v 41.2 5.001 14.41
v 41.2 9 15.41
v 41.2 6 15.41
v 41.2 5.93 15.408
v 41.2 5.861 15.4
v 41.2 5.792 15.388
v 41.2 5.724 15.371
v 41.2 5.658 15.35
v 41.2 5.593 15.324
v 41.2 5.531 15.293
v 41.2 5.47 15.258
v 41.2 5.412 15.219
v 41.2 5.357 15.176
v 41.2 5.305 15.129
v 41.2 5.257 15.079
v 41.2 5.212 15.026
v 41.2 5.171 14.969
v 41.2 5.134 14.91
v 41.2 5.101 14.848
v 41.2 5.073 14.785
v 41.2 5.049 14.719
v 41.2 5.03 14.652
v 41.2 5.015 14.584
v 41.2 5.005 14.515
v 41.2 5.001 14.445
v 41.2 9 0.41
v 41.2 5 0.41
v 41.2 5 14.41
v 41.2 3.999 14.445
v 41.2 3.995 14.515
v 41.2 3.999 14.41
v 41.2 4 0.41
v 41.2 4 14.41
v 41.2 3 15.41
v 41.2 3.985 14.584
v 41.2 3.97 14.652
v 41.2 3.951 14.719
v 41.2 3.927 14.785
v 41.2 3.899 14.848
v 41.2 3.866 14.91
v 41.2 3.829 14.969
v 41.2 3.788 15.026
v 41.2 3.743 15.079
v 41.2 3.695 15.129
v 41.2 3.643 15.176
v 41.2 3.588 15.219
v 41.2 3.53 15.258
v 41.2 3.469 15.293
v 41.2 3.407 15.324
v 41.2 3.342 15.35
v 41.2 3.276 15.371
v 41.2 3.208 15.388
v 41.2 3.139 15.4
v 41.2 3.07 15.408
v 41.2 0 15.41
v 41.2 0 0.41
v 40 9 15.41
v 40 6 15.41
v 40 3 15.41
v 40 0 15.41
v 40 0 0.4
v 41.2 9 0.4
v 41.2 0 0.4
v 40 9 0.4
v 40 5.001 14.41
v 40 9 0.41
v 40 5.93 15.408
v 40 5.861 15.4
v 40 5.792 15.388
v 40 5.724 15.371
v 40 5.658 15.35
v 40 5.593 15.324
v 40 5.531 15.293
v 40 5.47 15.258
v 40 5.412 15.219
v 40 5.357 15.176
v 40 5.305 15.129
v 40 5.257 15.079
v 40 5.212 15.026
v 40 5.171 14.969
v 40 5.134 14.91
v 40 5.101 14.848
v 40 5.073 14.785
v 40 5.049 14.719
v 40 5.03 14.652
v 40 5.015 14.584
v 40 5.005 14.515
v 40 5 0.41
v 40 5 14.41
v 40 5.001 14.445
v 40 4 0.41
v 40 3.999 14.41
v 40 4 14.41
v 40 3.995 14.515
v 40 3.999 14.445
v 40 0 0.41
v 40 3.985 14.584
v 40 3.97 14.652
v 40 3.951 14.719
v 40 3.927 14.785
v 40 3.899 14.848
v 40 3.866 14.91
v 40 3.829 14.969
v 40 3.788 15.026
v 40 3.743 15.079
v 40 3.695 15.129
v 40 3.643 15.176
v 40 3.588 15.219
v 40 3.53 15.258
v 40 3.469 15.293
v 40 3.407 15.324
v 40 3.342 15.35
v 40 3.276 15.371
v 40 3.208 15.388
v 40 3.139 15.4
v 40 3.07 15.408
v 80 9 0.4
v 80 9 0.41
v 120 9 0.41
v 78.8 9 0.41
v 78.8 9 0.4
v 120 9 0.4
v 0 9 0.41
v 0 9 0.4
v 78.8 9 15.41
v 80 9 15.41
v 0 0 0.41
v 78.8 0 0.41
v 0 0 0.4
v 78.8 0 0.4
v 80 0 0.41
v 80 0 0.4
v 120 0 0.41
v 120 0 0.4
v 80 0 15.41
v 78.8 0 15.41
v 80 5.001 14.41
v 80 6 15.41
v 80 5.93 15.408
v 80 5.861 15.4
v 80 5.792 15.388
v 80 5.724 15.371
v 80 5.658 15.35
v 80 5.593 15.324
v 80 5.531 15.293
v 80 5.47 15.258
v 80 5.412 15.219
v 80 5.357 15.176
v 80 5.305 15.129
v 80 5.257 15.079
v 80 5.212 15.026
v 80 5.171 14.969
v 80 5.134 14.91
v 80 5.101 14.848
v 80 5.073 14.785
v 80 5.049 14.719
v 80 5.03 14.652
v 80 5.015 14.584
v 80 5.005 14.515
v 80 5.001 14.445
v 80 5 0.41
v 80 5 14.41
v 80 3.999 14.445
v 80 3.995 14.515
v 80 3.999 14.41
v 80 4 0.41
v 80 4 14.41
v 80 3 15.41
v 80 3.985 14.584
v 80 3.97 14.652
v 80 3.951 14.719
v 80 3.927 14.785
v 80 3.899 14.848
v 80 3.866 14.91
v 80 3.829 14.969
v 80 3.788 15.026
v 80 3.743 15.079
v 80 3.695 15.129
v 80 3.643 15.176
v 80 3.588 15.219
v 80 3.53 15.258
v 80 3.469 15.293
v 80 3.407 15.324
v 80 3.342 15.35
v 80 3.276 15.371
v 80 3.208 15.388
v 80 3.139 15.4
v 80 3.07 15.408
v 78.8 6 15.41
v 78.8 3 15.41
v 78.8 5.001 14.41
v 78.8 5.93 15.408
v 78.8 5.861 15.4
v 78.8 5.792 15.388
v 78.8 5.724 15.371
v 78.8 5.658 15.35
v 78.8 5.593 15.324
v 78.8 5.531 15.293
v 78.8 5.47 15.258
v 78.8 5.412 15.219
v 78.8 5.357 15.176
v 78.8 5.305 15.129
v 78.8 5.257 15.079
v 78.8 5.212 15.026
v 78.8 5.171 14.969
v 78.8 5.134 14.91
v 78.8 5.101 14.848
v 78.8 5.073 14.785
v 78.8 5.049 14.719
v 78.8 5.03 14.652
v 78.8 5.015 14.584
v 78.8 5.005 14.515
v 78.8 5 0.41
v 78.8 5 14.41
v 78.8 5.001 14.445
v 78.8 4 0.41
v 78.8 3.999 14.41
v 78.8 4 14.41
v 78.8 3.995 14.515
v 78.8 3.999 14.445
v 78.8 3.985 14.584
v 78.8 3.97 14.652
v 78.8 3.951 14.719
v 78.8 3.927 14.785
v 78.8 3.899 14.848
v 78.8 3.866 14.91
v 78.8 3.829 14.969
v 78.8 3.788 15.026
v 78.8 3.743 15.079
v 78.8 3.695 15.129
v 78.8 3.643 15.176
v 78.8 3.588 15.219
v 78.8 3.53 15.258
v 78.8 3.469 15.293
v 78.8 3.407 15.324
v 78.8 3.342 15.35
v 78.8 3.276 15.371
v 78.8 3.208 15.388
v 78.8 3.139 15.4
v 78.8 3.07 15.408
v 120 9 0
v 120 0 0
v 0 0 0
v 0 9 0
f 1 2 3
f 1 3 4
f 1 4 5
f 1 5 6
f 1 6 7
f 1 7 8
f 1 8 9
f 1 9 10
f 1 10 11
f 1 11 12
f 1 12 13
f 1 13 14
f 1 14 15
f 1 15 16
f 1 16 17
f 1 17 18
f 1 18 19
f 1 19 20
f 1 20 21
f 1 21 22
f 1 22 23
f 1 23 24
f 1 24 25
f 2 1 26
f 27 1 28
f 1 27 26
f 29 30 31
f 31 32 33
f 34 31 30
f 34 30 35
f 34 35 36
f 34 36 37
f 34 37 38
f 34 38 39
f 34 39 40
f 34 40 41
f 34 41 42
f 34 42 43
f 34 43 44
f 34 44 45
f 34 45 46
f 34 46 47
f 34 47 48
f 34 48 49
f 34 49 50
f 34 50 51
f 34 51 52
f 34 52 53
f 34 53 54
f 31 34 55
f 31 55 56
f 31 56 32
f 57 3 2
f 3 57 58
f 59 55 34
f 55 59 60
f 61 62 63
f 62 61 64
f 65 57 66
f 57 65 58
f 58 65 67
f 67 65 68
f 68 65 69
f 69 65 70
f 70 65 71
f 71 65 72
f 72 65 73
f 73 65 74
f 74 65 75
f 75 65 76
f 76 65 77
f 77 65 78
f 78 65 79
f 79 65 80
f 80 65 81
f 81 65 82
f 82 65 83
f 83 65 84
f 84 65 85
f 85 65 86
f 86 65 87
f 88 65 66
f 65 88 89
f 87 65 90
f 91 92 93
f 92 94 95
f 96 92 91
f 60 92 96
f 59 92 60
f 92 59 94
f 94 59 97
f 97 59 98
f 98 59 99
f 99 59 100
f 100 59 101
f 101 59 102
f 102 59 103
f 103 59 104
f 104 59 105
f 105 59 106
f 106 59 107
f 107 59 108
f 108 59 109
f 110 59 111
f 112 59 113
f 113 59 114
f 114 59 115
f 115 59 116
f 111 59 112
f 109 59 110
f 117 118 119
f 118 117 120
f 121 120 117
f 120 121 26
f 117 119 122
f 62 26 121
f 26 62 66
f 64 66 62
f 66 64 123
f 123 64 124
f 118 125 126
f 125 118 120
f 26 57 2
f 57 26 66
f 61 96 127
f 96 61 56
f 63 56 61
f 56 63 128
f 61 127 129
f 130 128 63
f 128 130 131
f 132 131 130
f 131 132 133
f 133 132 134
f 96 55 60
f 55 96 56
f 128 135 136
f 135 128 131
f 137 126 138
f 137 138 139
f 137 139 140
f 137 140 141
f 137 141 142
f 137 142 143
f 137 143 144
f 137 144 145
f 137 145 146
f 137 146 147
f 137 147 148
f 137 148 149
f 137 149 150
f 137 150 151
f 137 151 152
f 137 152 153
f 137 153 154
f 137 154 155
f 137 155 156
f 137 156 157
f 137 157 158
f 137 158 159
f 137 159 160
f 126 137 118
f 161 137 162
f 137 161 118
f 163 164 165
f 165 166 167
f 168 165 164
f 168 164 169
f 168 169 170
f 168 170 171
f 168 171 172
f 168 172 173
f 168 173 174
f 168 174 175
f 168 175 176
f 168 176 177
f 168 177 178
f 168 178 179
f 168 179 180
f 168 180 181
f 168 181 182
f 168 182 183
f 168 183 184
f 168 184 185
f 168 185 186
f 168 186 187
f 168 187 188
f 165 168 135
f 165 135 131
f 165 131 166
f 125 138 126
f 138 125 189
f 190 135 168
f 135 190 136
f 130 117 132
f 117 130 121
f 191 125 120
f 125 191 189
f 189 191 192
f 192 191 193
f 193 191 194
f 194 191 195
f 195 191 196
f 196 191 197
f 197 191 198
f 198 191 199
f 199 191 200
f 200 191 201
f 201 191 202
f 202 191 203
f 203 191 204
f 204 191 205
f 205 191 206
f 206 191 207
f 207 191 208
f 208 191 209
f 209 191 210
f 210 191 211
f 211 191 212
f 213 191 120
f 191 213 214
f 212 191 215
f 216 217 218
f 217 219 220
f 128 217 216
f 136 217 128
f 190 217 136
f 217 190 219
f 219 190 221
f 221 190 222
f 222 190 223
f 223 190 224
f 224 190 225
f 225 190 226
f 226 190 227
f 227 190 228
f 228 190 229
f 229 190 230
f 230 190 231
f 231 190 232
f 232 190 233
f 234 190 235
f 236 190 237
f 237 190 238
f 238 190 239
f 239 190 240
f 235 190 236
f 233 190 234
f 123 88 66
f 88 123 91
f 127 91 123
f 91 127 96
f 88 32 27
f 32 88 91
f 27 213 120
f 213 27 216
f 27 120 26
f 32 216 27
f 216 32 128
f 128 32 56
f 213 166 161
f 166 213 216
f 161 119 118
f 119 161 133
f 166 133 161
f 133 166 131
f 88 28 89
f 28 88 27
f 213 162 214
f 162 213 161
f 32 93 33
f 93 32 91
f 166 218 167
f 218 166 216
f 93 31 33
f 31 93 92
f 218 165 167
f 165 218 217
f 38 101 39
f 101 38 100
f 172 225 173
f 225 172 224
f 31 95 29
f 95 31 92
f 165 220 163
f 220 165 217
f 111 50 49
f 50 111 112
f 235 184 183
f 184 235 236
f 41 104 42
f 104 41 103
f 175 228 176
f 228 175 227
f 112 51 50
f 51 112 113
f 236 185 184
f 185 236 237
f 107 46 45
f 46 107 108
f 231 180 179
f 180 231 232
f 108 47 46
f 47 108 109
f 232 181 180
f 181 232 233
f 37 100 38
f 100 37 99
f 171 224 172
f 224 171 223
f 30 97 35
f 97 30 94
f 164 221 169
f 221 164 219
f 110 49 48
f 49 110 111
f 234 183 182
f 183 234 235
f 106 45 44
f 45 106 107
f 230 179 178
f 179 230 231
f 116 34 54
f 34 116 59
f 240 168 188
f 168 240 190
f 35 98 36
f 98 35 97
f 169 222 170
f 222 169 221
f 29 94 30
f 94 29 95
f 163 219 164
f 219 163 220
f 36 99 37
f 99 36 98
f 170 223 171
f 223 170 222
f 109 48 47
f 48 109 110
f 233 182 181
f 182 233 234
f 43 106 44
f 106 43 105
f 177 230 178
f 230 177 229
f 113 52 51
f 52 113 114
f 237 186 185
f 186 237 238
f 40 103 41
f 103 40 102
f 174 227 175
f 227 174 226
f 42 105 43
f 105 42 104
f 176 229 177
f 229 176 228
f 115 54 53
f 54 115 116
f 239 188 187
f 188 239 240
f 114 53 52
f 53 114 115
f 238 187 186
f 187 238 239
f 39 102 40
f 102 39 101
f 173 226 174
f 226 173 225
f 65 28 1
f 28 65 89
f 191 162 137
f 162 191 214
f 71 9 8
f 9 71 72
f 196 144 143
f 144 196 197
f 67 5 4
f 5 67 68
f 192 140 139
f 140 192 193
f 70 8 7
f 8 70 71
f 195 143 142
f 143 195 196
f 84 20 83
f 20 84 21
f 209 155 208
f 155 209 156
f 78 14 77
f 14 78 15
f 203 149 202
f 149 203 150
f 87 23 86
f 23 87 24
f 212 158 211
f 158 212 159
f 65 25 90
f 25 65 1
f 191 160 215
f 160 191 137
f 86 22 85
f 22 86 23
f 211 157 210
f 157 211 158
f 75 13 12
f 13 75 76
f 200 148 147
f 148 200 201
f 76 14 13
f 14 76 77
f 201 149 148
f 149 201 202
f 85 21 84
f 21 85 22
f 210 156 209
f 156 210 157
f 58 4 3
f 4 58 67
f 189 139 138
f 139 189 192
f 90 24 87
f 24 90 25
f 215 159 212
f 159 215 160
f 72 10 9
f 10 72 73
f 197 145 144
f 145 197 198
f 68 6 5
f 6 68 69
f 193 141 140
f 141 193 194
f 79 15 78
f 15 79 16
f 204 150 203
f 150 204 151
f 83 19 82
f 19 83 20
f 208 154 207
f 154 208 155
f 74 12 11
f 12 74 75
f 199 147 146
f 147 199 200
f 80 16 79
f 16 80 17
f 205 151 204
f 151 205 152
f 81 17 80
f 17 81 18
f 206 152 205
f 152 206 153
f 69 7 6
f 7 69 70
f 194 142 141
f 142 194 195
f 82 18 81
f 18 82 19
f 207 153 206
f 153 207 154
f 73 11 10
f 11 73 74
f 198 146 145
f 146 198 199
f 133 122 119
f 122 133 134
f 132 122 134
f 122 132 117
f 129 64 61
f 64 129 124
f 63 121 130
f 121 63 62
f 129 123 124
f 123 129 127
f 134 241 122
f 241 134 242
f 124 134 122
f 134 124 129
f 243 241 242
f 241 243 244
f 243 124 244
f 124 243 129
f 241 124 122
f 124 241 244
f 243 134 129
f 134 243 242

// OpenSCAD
// file: ../../Base/Rotation.scad
// Fischertechnik Box Foundation
// Geometry Helpers Rotation

include <PlacementOptions.scad>

// getRotatedSpace(space, rotation=NoRotation)
// Rotates the space dependent on the specified rotation

function getRotatedSpace(space, rotation=NoRotation) = [
    (rotation == Rotate90 || rotation == Rotate270) ? space.y : space.x,
    (rotation == Rotate90 || rotation == Rotate270) ? space.x : space.y
];

// Rotates the given space around the fixed left lower corner
// space = the space the children needs as width/depth list [width,depth]
// rotation = 0 Rotate0 degrees, 1 Rotate90 degrees, 2 Rotate180 degrees, 3 Rotate270 degrees (equivalent to -90)

module RotateFix(space, rotation=NoRotation) {
    dy = (rotation == Rotate0 || rotation == Rotate270) ? 0 :
        (rotation == Rotate90) ? space.x :
        space.y;
    dx = (rotation < Rotate180) ? 0 :
        (rotation == Rotate180) ? space.x :
        space.y;
    
    translate([dx, dy, 0])
        rotate([0, 0, rotations[rotation]])
            children();
}
// file: ../../Base/Alignment.scad
// Fischertechnik Box Foundation
// Geometry Helpers Alignment

include <PlacementOptions.scad>

// getAlignedX(elementWidth, spaceWidth, align=AlignRight, offset=0)
// Gets the aligned X offset of an element with the given
// width in the given space.
// elementWidth = The width of the element to positon
// spaceWidth = The space where the element should be aligned
// align = 0 AlignLeft, 1 AlignCenter, 2 AlignRight
// offset = an optional offset from the aligned position. When
// aligned left or centered, then positive values are in X direction.
// When aligned right then positive values are in negative X direction.

function getAlignedX(elementWidth, spaceWidth, align=AlignRight, offset=0) =
    (align == AlignLeft) ?
        offset :
        ((align == AlignCenter) ?
        (spaceWidth - elementWidth)/2 + offset :
        spaceWidth - offset - elementWidth);

// getAlignedY(elementDepth, spaceDepth, align=AlignTop, offset=0)
// Gets the aligned Y offset of an element with the given
// depth in the given space.
// elementDepth = The depth of the element to positon
// spaceDepth = The space where the element should be aligned
// align = 0 AlignBottom, 1 AlignCenter, 2 AlignTop
// offset = an optional offset from the aligned position. When
// aligned bottom or centered, then positive values are in Y direction.
// When aligned top then positive values are in negative Y direction.

function getAlignedY(elementDepth, spaceDepth, align=AlignTop, offset=0) =
    (align == AlignBottom) ?
        offset :
        ((align == AlignCenter) ?
        (spaceDepth - elementDepth)/2 + offset :
        spaceDepth - offset - elementDepth);
// file: ../../Base/PlacementOptions.scad
// Fischertechnik Box Foundation
// Placement Options

// Alignment
NoAlign = 0;
AlignLeft = 1;
AlignBottom = 2;
AlignCenter = 3;
AlignRight = 4;
AlignTop = 5;

// Element rotation degree steps
rotations = [0, -90, -180, -270];

// Rotation
NoRotation = 0;
Rotate0 = 0;
Rotate90 = 1;
Rotate180 = 2;
Rotate270 = 3;

// Docking (seen from above)
NoDock = -1;
DockLeft = 0;
DockTop = 1;
DockRight = 2;
DockCorner = 2;
DockBottom = 3;

// Web corners
LowerLeft = 0;
UpperLeft = 1;
UpperRight = 2;
LowerRight = 3;

// Web position relative to corner
LeftOfCorner = 0;
RightOfCorner = 1;
// file: ../../Base/Boxes.scad
// Fischertechnik Box Foundation
// Pre-designed Boxes

use <Constants.scad>

include <PlacementOptions.scad>

box190Width = 190;
box190Depth = 130;
box130Width = 130;
box130Depth = 95;

// Values are from an original ec3 box
topBottomDifference = 1.5;
outerHeight = 40;
innerHeight = 38.2;
baseThickness = outerHeight - innerHeight;
stackExcess = 5.7;
radius = 3.5;
wallThickness = 1.5;
tolerance = 0.2;
stackOffset = innerHeight - stackExcess;

boxUsageHeight = stackOffset;
boxWallThickness = wallThickness;
boxBaseThickness = baseThickness;
boxWebWidth = 3.0;

// getBoxWallThickness()
// Gets the wall thickness of a Fischertechnik Box
function getBoxWallThickness() = boxWallThickness;

// getBoxUsageHeight()
// Gets the usable height of a Fischertechnik box
function getBoxUsageHeight() = boxUsageHeight;

// getBoxInnerHeight()
// Gets the inner height of a Fischertechnik box, including the stack excess
function getBoxInnerHeight() = innerHeight;

// getBoxBaseThickness()
// Gets the thickness of the Fischertechnik box base.
function getBoxBaseThickness() = boxBaseThickness;

// getBoxWebWidth()
// Gets the width of a box web
function getBoxWebWidth() = boxWebWidth;

// getBox190Space()
// Gets the usable inner space of a Box 190 as an x/y-list
function getBox190Space() = [
    box190Width - 2*getBoxWallThickness() - topBottomDifference, 
    box190Depth - 2*getBoxWallThickness() - topBottomDifference ];

// BoxBase(width, depth)
// Creates an empty stackable Fischertechnik compatible box
// width = Outer width of the box (190, 130, ...)
// depth = Outer depth of the box (130, 95, ...)

module BoxBase(width, depth, height=outerHeight) {    
    thinPlate = 0.01;

    innerHeight = height - baseThickness;    
    
    module BodyPlate(width, depth) {
        translate([radius, radius])
        hull() {
            w = width-2*radius;
            d = depth-2*radius;
            cube([w, d, thinPlate]);
            cylinder(thinPlate, r=radius, $fn=getFragments());
            translate([w, 0])
                cylinder(thinPlate, r=radius, $fn=getFragments());
            translate([w, d])
                cylinder(thinPlate, r=radius, $fn=getFragments());
            translate([0, d])
                cylinder(thinPlate, r=radius, $fn=getFragments());
        }
    }
    
    module Body(tolerance=tolerance) {
        hull() {
            // Bottom with tolerance to fit into the original boxes when stacked
            translate([-wallThickness+tolerance, -wallThickness+tolerance, -baseThickness])
                BodyPlate(width-topBottomDifference-2*tolerance, depth-topBottomDifference-2*tolerance);
            
            // Top
            translate([-wallThickness-topBottomDifference/2, -wallThickness-topBottomDifference/2, innerHeight-thinPlate])
                BodyPlate(width, depth);
         }
    }

    module Cutoff() {
        hull() {
            coWidth = width - 2*wallThickness;
            coDepth = depth - 2*wallThickness;
            
            // Bottom
            BodyPlate(coWidth-topBottomDifference, coDepth-topBottomDifference);

            // Top
            translate([-topBottomDifference/2, -topBottomDifference/2, innerHeight+thinPlate]) 
                BodyPlate(coWidth, coDepth);
        }
    }
    
    difference() {        
        Body();
        Cutoff();
        stackOffset = innerHeight - stackExcess;
        translate([0, 0, stackOffset + baseThickness])
            Body(tolerance=0);
    }
}

// Creates the Fischertechnik empty box 130x190 mm and places it at position 0,0
// 190x130 are the outer sizes, the inner space is slightly smaller. Use getBox190Space() to get the inner sizes.
// The box is positioned that the usable inner space is at the 0,0,0 position. The

module Box190() {
    BoxBase(box190Width, box190Depth);
}

// Gets the usable inner space of a Box 130 as an x/y-list
function getBox130Space() = [
    box130Width - 2*getBoxWallThickness() - topBottomDifference, 
    box130Depth - 2*getBoxWallThickness() - topBottomDifference ];

// Creates the Fischertechnik empty box 95x130 mm and places it at position 0,0
// 190x130 are the outer sizes, the inner space is slightly smaller. Use getBox190Space() to get the inner sizes.
// The box is positioned that the usable inner space is at the 0,0,0 position. The

module Box130() {
    BoxBase(box130Width, box130Depth);
}

// Creates a web at the specified box walls
// corner 0 = LowerLeft, 1 = UpperLeft, 2 = UpperRight, 3 = LowerRight
// side 0 = LeftOfCorner, 1 = RightOfCorner
// distance = Distance in mm from the corner
// boxSpace = inner width and depth of the box (default: Box 190)
// webWidth = length of the web (default is 3 mms)
// webThickness = thickness of the web (default is 1 mm)

module BoxWeb(corner, side, distance, boxSpace=getBox190Space(), webWidth=getBoxWebWidth(), webThickness=1.0) {
    sink = getBoxWallThickness()/2;

    width = (corner % 2 == 0) ? 
            (side == LeftOfCorner ? webWidth : webThickness) :
            (side == LeftOfCorner ? webThickness : webWidth);

    depth = (corner % 2 == 0) ? 
            (side == RightOfCorner ? webWidth : webThickness) :
            (side == RightOfCorner ? webThickness : webWidth);
    
    xDiff = corner == LowerLeft ? 
                (side == LeftOfCorner ? -sink : distance) :
            (corner == UpperLeft ?                
                (side == LeftOfCorner ? distance : -sink) :
            (corner == UpperRight ?
                (side == LeftOfCorner ? boxSpace.x-webWidth+sink : boxSpace.x-distance-webThickness) :
                (side == LeftOfCorner ? boxSpace.x-distance-webThickness: boxSpace.x-webWidth+sink)));

    yDiff = corner == LowerLeft ? 
                (side == RightOfCorner ? -sink : distance) :
            (corner == UpperLeft ?
                (side == RightOfCorner ? boxSpace.y-distance : boxSpace.y-webWidth+sink) :
            (corner == UpperRight ?
                (side == RightOfCorner ? boxSpace.y-webWidth+sink : boxSpace.y-distance) :
                (side == RightOfCorner ? distance : -sink)));
    
    translate([xDiff, yDiff, -getExcess()])
        cube([width, depth, boxUsageHeight + 2*getExcess()]);
}
// file: ../../Base/Placement.scad
// Fischertechnik Box Foundation
// Geometry Helpers Placement

use <Constants.scad>
use <Alignment.scad>
use <Rotation.scad>
use <Boxes.scad>

include <PlacementOptions.scad>

// Place(x=0, y=0, elementSpace=[0,0], alignX=AlignLeft, alignY=AlignBottom, rotation=Rotate0, boxSpace=getBox190Space())
// Places the child at the specified position
// y = Y-Position. This is a relative position when an X aligment is specified.
// x = X-Position. This is a relative position when an Y aligment is specified.
// elementSpace = space of the element to be placed [x,y]
// alignX = -1=NoAlign, 0 AlignLeft, 1 AlignCenter, 3 AlignRight (elementSpace and boxSpace required!)
// alignY = -1=NoAlign, 2 AlignBottom, 1 AlignCenter, 4 AlignTop (elementSpace and boxSpace required!)
// rotation = 0 Rotate0 0 degrees, 1 Rotate90 90 degrees, 
// 2 Rotate180 180 degrees, 3 Rotate270 270 degrees (equivalent to -90)
// boxSpace = Inner space of the box where the placement occurs [x,y] - default is Box 190x130 inner space

module Place(x=0, y=0, elementSpace=[0,0], 
  alignX=AlignLeft, alignY=AlignBottom, 
  rotation=NoRotation, boxSpace=getBox190Space()) {

    module Position(x, y, space, rotation=Rotate0) {
        translate([x, y, 0])
            RotateFix(space, rotation)
                children();
    }

    space = getRotatedSpace(elementSpace, rotation);
    alignedX = getAlignedX(space.x, boxSpace.x, alignX, x);
    alignedY = getAlignedY(space.y, boxSpace.y, alignY, y);
    Position(alignedX, alignedY, elementSpace, rotation)
        children();
}

// Center(space=getBox130Space(), elementSpace=[0,0])
// space = Space where the children is centered. For cylinder use centered=true and no elementSpace.
// elementSpace = space of the element to be centered [x,y]

module Center(space=getBox190Space(), elementSpace=[0,0]) {
    Place(elementSpace=elementSpace, boxSpace=space, alignX=AlignCenter, alignY=AlignCenter)
        children();
}

// CenterHorizontal(width=0, y=0, offset=0, space=getBox130Space())
// width = Width of the element to be placed.
// y = Y position of the element
// offset = Offset from the center position (negative will be left of the center)
// space = Space where the element is placed

module CenterHorizontal(width=0, y=0, offset=0, space=getBox190Space()) {
    Place(x=offset, y=y, elementSpace=[width, 0], boxSpace=space, alignX=AlignCenter)
        children(0);
}

// CenterVertical(depth=0, x=0, offset=0, space=getBox130Space())
// depth = Depth of the element to be placed.
// x = X position of the element
// offset = Offset from the center position (negative will be down of the center)
// space = Space where the element is placed

module CenterVertical(depth=0, x=0, offset=0, space=getBox190Space()) {
    Place(x=x, y=offset, elementSpace=[0, depth], boxSpace=space, alignY=AlignCenter)
        children(0);
}

// getIsVertical(align)
// True if the specified alignment needs a vertical orientation for a divider (AlignRight, AlignLeft)

function getIsVertical(align) = (align == AlignRight || align == AlignLeft);

// getIsHorizontal(align)
// True if the specified alignment needs a horizontal orientation for a divider (AlignTop, AlignBottom)

function getIsHorizontal(align) = (align == AlignTop || align == AlignBottom);
// file: ../../Elements/AxisClip10.scad
// Fischertechnik Box Library
// Axis for clip 10
// 31023

use <../ModelBase/Simple.scad>
use <../Base/Constants.scad>

width = 12;
depth = 12;
height = 23;
upperDiameter = 3.6;
clipHeight = 10;

// getAxisClip10Space()
// Gets the space of a frame for a clip 10 with spring ring (mot2)

function getAxisClip10Space() = [width, depth, height];

// AxisClip10(height, clipHeight)
// Axis for clip 10 with spring ring (mot2)
// height = Height of the complete axis
// clipHeight = Height of the rt for the clip (standard is 10, in mot3 its only 7)

module AxisClip10(height=height, clipHeight=clipHeight) {
    LeveledAxisWithSpace(height, height-clipHeight, getAxisClip10Space(), diameter=upperDiameter);
}

// Tests
color("lightgray")
AxisClip10();
// file: ../../Base/Constants.scad
// Fischertechnik Box Foundation
// Constants

// Constant values necessary for multiple elements

// Base constants
dividerThickness = 1.2;
excess = 0.01;
fragments = 90;
tolerance = 0.8;

// Gets the thickness of a divider 
function getDividerThickness() = dividerThickness;

// Gets the excess that is used to merge walls into each other
function getExcess() = excess;

// Gets amount of fragments of a cylinder
function getFragments() = fragments;

// Gets the inner tolerance of a frame to each side
function getTolerance() = tolerance;


// Fischertechnik specific constants
axisDiameter = 4;
axisBottomDiameter = axisDiameter + 1;
standardEdgeDistance = 2.5;
standardWebDistance = 11.5;
standardCornerLength = 15;
tubeWallFactor = 0.8;
smallPartsFrameHeight = 20;

// Gets axis diameter
function getAxisDiameter() = axisDiameter;

// Gets axis bottom diameter for thicker part at the bottom
function getAxisBottomDiameter() = axisBottomDiameter;

// gets the standard distance to the wall of the box for dockable frames with webs
function getStandardEdgeDistance() = standardEdgeDistance;

// gets the standard distance of each web to the corner of the dockable frame
function getStandardWebDistance() = standardWebDistance;

// gets the standard length of the corner walls of a dockable frame
function getStandardCornerLength() = standardCornerLength;

// gets the wall thickness of a tube.
function getTubeWallThickness() = tubeWallFactor * getDividerThickness();

// gets the frame height for docked small parts boxes.
function getSmallPartsFrameHeight() = smallPartsFrameHeight;
// file: ../../Elements/HolderMirrorBand.scad
// Fischertechnik Box Library
// Holder for mirror band
// 31370

use <../Base/Constants.scad>
use <../ModelBase/Simple.scad>

width = 120;
depth = 9;
height = 15;

// getHolderMirrorBandSpace()
// Gets the space the nirror band holder needs for width and depth (.x and .y as a list)

function getHolderMirrorBandSpace() = [width, depth, height];

// HolderMirrorBand(xLeft=-1, xRight=-1)
// Holder for the mirror band from the ec3
// xLeft = X-Offset of the first holder from the left edge (-1 for default 40)
// xRight = X-Offset of the second holder from the right edge (-1 for default 40)

module HolderMirrorBand(xLeft=-1, xRight=-1) {
    
    gap = 1;
    radius = 1;
    gapY = (getHolderMirrorBandSpace().y - gap)/2;
    
    Space(getHolderMirrorBandSpace());

    module RoundCorner(yOffset=0, excess=0) {
        translate([0, gapY-radius+2*yOffset, height - radius*1.5])
        rotate([0, 90, 0]) {
            difference() {
                translate([-getExcess()-radius*1.5, -excess])
                    cube([radius+getExcess(), radius+getExcess(), width]);
                translate([-radius/2, yOffset])
                    cylinder(width + 1, radius, $fn=getFragments());
            }
        }
    }

    difference() {
        difference() {
            pos1 = xLeft==-1 ? width / 3 : xLeft;
            pos2 = width - (xRight==-1 ? width / 3 : xRight) - getDividerThickness();
            
            translate([0, 0, -getExcess()]) {
                translate([pos1, 0])
                    cube([getDividerThickness(), getHolderMirrorBandSpace().y, height + getExcess()]);
                translate([pos2, 0])
                    cube([getDividerThickness(), getHolderMirrorBandSpace().y, height + getExcess()]);
            }
            translate([0, gapY])
                cube([width, gap, height+1]);
        }
        
        RoundCorner();
        RoundCorner(radius, getExcess());
    }
    
}

// Tests
color("lightgray") {
HolderMirrorBand();
}
// file: ../TestPrint.scad
// 3D Print Test Base

use <../Base/Constants.scad>

use <../Elements/AxisClip10.scad>

module TestPrint(elementSpace) {
    cube([elementSpace.x, elementSpace.y, 0.4]);
    translate([0,0,0.4+getExcess()]) {
        children();
    }
}

TestPrint(getAxisClip10Space())
    AxisClip10();
// main file
// 3D Print Test
// HolderMirrorBand

use <../TestPrint.scad>
use <../../Elements/HolderMirrorBand.scad>

TestPrint(getHolderMirrorBandSpace())
    HolderMirrorBand();
